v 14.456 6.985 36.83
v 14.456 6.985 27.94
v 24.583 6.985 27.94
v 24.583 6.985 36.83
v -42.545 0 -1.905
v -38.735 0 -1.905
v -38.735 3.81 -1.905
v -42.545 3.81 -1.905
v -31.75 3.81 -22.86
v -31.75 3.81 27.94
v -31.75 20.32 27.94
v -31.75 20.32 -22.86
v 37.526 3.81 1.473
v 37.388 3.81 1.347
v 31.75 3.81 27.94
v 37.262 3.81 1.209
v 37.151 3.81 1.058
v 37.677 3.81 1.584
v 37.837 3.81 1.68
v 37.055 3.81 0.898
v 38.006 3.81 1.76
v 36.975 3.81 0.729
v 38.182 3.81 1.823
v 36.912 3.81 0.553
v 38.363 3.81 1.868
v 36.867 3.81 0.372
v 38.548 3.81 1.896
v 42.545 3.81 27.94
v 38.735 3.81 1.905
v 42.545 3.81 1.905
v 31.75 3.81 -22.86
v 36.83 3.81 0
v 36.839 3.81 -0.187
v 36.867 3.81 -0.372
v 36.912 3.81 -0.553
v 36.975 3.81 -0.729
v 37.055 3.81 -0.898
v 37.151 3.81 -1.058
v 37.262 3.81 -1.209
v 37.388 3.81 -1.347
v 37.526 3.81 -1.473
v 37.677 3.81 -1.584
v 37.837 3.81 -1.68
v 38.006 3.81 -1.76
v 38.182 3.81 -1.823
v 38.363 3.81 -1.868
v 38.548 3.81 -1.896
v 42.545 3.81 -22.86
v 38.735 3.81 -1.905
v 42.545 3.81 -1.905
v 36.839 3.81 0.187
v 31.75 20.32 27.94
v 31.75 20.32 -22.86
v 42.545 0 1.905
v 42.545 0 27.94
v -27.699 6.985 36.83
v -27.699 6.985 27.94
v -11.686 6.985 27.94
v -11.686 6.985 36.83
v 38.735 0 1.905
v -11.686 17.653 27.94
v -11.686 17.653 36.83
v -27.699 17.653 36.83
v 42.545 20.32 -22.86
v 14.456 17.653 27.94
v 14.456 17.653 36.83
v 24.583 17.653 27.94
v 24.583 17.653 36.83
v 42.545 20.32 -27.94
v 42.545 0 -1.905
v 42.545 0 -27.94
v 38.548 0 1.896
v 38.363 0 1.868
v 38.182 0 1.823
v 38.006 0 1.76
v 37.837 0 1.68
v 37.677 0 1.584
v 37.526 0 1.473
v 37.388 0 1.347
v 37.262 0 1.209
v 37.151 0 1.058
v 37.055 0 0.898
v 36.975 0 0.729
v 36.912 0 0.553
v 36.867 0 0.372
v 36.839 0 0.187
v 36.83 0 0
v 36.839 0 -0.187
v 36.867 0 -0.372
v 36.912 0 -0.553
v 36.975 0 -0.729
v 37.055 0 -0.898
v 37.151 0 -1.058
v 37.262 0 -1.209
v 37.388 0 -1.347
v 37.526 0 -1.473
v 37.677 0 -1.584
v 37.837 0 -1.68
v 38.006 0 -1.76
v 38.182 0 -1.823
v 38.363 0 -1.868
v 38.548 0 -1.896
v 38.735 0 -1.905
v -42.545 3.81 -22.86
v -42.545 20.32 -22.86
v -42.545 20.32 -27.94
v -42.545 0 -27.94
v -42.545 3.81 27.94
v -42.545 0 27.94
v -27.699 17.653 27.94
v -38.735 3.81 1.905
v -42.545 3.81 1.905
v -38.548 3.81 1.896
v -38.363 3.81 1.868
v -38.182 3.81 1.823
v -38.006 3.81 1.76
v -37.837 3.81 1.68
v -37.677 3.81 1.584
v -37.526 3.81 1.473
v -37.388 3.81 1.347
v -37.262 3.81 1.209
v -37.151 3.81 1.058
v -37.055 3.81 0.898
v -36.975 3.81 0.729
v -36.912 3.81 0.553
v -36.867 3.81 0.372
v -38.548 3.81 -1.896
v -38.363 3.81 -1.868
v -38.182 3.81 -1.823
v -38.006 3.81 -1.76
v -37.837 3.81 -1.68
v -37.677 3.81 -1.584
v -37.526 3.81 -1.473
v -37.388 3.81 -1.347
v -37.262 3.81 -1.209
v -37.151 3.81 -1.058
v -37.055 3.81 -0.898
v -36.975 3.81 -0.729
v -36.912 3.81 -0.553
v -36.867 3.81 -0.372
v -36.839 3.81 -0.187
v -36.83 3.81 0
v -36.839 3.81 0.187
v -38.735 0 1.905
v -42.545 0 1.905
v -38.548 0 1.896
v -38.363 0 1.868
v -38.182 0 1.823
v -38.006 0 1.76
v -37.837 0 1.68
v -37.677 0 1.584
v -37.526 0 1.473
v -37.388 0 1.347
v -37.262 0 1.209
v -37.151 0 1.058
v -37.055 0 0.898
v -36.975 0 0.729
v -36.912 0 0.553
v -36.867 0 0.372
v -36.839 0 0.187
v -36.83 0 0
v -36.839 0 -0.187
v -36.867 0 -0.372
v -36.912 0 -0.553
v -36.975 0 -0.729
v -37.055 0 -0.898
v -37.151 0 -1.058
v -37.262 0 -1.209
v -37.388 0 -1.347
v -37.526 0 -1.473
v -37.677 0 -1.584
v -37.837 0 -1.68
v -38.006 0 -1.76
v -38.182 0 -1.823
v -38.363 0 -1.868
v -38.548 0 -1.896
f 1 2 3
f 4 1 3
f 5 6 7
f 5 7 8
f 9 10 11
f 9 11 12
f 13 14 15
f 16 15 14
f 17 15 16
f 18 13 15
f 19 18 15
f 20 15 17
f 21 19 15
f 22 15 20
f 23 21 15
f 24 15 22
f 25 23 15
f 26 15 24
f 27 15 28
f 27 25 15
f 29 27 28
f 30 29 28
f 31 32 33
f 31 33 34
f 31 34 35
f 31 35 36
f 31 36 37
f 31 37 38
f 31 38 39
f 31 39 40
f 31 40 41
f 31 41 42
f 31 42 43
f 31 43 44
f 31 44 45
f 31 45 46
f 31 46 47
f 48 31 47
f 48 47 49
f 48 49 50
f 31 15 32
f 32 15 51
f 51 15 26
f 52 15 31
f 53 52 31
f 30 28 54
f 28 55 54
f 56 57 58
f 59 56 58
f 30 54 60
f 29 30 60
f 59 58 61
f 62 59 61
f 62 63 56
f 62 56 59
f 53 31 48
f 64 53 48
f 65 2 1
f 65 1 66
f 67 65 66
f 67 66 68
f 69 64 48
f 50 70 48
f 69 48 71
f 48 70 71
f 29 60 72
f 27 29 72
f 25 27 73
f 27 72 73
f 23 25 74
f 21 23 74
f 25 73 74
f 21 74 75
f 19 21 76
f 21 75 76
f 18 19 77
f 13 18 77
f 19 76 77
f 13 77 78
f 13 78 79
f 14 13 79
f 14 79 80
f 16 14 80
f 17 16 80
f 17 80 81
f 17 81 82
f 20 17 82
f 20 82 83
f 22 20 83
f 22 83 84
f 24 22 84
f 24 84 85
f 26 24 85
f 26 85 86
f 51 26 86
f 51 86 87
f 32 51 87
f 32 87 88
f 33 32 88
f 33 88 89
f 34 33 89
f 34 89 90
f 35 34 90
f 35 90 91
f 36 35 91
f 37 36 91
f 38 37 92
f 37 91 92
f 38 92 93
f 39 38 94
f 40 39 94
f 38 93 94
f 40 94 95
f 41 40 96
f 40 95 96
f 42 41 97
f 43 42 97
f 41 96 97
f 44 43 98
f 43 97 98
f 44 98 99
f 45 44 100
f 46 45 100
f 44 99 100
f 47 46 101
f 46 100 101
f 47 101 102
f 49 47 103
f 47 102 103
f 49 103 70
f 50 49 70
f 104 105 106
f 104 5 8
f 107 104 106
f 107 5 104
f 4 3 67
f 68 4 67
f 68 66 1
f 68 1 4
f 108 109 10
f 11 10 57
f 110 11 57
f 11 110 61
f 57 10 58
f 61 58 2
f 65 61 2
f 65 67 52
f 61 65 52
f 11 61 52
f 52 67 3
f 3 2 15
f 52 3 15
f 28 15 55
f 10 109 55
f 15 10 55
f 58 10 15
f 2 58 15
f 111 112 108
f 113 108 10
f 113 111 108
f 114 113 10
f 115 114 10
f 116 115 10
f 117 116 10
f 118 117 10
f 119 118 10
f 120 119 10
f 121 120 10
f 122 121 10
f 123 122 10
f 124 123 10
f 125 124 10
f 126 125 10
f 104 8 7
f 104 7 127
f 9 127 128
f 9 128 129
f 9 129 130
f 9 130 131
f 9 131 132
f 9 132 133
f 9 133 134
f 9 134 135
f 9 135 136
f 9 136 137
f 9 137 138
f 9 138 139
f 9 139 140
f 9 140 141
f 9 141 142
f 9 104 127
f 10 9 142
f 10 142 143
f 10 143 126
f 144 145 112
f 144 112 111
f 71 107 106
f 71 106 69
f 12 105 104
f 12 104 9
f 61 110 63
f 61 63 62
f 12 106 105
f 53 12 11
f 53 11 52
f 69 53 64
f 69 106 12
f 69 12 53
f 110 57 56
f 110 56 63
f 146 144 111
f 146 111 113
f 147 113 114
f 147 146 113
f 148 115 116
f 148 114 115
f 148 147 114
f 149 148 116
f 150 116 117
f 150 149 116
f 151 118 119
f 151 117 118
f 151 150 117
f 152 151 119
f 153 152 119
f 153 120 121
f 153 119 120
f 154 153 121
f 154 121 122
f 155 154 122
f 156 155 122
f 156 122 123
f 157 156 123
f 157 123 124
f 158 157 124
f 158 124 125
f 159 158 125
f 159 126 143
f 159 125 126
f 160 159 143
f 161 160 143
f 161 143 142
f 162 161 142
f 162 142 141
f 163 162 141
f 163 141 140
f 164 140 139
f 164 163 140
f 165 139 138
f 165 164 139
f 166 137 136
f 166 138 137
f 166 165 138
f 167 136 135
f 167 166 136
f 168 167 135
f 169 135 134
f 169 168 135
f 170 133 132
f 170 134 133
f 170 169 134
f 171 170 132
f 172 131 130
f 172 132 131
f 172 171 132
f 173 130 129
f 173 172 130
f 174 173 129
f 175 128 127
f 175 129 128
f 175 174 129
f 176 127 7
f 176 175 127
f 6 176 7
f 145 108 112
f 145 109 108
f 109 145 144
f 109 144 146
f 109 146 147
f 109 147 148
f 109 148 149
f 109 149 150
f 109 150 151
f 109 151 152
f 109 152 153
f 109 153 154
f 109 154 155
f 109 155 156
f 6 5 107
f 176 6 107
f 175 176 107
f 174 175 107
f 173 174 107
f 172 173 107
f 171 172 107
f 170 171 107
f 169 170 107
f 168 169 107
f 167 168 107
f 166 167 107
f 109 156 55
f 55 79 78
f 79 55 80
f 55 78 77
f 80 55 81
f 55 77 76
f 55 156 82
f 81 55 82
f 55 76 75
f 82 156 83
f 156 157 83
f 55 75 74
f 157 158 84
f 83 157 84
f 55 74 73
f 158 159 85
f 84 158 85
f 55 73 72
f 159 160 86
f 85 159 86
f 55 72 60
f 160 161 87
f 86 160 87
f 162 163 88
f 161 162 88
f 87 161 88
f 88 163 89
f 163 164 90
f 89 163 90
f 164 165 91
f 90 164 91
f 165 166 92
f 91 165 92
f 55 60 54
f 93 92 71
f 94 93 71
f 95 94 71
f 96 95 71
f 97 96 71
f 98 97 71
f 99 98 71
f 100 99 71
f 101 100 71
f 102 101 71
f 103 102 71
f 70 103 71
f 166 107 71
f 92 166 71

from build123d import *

# Parameters (mm, degrees)
SKETCH2_W               = 85.09
SKETCH2_H               = 55.88
BOSS_EXTRUDE1_DEPTH     = 3.81
SKETCH3_W               = 63.5
SKETCH3_H               = 50.8
BOSS_EXTRUDE2_DEPTH     = 16.51
SKETCH4_W               = 85.09
SKETCH4_H               = 5.08
BOSS_EXTRUDE3_DEPTH     = 16.51
CUT_EXTRUDE1_DEPTH      = 54.509818959
CUT_EXTRUDE1_DEPTH_BACK = 54.509818959
SKETCH6_W               = 16.01364416
SKETCH6_H               = 10.668
SKETCH6_W_2             = 10.127547929
BOSS_EXTRUDE4_DEPTH     = 8.89


with BuildPart() as part:
    # Sketch2 → Boss-Extrude1 (new body)
    with BuildSketch(Plane(origin=(0, 0, 0), x_dir=(1, 0, 0), z_dir=(0, 1, 0))):
        Rectangle(SKETCH2_W, SKETCH2_H)
    extrude(amount=BOSS_EXTRUDE1_DEPTH)

    # Sketch3 → Boss-Extrude2 (add)
    with BuildSketch(Plane(origin=(0, 3.81, 0), x_dir=(1, 0, 0), z_dir=(0, 1, 0))):
        with Locations((0, -2.54)):
            Rectangle(SKETCH3_W, SKETCH3_H)
    extrude(amount=BOSS_EXTRUDE2_DEPTH)

    # Sketch4 → Boss-Extrude3 (add)
    with BuildSketch(Plane(origin=(0, 3.81, 0), x_dir=(1, 0, 0), z_dir=(0, 1, 0))):
        with Locations((0, 25.4)):
            Rectangle(SKETCH4_W, SKETCH4_H)
    extrude(amount=BOSS_EXTRUDE3_DEPTH)

    # Sketch5 → Cut-Extrude1 (cut, two sides: drawn at the far end of the back side and taken through both)
    with BuildSketch(Plane(origin=(0, 3.81, 0), x_dir=(1, 0, 0), z_dir=(0, 1, 0)).offset(-CUT_EXTRUDE1_DEPTH_BACK)):
        with BuildLine():
            Line((38.735, 1.905), (42.545, 1.905))
            Line((42.545, 1.905), (42.545, -1.905))
            Line((42.545, -1.905), (38.735, -1.905))
            ThreePointArc((38.735, -1.905), (36.83, 0), (38.735, 1.905))
        make_face()
        with BuildLine():
            Line((-42.545, 1.905), (-42.545, -1.905))
            Line((-42.545, -1.905), (-38.735, -1.905))
            ThreePointArc((-38.735, -1.905), (-36.83, 0), (-38.735, 1.905))
            Line((-38.735, 1.905), (-42.545, 1.905))
        make_face()
    extrude(amount=CUT_EXTRUDE1_DEPTH + CUT_EXTRUDE1_DEPTH_BACK, mode=Mode.SUBTRACT)

    # Sketch6 → Boss-Extrude4 (add)
    with BuildSketch(Plane.XY.offset(27.94)):
        with Locations((-19.692454306, 12.319)):
            Rectangle(SKETCH6_W, SKETCH6_H)
        with Locations((19.519333829, 12.319)):
            Rectangle(SKETCH6_W_2, SKETCH6_H)
    extrude(amount=BOSS_EXTRUDE4_DEPTH)


solid = part.part
